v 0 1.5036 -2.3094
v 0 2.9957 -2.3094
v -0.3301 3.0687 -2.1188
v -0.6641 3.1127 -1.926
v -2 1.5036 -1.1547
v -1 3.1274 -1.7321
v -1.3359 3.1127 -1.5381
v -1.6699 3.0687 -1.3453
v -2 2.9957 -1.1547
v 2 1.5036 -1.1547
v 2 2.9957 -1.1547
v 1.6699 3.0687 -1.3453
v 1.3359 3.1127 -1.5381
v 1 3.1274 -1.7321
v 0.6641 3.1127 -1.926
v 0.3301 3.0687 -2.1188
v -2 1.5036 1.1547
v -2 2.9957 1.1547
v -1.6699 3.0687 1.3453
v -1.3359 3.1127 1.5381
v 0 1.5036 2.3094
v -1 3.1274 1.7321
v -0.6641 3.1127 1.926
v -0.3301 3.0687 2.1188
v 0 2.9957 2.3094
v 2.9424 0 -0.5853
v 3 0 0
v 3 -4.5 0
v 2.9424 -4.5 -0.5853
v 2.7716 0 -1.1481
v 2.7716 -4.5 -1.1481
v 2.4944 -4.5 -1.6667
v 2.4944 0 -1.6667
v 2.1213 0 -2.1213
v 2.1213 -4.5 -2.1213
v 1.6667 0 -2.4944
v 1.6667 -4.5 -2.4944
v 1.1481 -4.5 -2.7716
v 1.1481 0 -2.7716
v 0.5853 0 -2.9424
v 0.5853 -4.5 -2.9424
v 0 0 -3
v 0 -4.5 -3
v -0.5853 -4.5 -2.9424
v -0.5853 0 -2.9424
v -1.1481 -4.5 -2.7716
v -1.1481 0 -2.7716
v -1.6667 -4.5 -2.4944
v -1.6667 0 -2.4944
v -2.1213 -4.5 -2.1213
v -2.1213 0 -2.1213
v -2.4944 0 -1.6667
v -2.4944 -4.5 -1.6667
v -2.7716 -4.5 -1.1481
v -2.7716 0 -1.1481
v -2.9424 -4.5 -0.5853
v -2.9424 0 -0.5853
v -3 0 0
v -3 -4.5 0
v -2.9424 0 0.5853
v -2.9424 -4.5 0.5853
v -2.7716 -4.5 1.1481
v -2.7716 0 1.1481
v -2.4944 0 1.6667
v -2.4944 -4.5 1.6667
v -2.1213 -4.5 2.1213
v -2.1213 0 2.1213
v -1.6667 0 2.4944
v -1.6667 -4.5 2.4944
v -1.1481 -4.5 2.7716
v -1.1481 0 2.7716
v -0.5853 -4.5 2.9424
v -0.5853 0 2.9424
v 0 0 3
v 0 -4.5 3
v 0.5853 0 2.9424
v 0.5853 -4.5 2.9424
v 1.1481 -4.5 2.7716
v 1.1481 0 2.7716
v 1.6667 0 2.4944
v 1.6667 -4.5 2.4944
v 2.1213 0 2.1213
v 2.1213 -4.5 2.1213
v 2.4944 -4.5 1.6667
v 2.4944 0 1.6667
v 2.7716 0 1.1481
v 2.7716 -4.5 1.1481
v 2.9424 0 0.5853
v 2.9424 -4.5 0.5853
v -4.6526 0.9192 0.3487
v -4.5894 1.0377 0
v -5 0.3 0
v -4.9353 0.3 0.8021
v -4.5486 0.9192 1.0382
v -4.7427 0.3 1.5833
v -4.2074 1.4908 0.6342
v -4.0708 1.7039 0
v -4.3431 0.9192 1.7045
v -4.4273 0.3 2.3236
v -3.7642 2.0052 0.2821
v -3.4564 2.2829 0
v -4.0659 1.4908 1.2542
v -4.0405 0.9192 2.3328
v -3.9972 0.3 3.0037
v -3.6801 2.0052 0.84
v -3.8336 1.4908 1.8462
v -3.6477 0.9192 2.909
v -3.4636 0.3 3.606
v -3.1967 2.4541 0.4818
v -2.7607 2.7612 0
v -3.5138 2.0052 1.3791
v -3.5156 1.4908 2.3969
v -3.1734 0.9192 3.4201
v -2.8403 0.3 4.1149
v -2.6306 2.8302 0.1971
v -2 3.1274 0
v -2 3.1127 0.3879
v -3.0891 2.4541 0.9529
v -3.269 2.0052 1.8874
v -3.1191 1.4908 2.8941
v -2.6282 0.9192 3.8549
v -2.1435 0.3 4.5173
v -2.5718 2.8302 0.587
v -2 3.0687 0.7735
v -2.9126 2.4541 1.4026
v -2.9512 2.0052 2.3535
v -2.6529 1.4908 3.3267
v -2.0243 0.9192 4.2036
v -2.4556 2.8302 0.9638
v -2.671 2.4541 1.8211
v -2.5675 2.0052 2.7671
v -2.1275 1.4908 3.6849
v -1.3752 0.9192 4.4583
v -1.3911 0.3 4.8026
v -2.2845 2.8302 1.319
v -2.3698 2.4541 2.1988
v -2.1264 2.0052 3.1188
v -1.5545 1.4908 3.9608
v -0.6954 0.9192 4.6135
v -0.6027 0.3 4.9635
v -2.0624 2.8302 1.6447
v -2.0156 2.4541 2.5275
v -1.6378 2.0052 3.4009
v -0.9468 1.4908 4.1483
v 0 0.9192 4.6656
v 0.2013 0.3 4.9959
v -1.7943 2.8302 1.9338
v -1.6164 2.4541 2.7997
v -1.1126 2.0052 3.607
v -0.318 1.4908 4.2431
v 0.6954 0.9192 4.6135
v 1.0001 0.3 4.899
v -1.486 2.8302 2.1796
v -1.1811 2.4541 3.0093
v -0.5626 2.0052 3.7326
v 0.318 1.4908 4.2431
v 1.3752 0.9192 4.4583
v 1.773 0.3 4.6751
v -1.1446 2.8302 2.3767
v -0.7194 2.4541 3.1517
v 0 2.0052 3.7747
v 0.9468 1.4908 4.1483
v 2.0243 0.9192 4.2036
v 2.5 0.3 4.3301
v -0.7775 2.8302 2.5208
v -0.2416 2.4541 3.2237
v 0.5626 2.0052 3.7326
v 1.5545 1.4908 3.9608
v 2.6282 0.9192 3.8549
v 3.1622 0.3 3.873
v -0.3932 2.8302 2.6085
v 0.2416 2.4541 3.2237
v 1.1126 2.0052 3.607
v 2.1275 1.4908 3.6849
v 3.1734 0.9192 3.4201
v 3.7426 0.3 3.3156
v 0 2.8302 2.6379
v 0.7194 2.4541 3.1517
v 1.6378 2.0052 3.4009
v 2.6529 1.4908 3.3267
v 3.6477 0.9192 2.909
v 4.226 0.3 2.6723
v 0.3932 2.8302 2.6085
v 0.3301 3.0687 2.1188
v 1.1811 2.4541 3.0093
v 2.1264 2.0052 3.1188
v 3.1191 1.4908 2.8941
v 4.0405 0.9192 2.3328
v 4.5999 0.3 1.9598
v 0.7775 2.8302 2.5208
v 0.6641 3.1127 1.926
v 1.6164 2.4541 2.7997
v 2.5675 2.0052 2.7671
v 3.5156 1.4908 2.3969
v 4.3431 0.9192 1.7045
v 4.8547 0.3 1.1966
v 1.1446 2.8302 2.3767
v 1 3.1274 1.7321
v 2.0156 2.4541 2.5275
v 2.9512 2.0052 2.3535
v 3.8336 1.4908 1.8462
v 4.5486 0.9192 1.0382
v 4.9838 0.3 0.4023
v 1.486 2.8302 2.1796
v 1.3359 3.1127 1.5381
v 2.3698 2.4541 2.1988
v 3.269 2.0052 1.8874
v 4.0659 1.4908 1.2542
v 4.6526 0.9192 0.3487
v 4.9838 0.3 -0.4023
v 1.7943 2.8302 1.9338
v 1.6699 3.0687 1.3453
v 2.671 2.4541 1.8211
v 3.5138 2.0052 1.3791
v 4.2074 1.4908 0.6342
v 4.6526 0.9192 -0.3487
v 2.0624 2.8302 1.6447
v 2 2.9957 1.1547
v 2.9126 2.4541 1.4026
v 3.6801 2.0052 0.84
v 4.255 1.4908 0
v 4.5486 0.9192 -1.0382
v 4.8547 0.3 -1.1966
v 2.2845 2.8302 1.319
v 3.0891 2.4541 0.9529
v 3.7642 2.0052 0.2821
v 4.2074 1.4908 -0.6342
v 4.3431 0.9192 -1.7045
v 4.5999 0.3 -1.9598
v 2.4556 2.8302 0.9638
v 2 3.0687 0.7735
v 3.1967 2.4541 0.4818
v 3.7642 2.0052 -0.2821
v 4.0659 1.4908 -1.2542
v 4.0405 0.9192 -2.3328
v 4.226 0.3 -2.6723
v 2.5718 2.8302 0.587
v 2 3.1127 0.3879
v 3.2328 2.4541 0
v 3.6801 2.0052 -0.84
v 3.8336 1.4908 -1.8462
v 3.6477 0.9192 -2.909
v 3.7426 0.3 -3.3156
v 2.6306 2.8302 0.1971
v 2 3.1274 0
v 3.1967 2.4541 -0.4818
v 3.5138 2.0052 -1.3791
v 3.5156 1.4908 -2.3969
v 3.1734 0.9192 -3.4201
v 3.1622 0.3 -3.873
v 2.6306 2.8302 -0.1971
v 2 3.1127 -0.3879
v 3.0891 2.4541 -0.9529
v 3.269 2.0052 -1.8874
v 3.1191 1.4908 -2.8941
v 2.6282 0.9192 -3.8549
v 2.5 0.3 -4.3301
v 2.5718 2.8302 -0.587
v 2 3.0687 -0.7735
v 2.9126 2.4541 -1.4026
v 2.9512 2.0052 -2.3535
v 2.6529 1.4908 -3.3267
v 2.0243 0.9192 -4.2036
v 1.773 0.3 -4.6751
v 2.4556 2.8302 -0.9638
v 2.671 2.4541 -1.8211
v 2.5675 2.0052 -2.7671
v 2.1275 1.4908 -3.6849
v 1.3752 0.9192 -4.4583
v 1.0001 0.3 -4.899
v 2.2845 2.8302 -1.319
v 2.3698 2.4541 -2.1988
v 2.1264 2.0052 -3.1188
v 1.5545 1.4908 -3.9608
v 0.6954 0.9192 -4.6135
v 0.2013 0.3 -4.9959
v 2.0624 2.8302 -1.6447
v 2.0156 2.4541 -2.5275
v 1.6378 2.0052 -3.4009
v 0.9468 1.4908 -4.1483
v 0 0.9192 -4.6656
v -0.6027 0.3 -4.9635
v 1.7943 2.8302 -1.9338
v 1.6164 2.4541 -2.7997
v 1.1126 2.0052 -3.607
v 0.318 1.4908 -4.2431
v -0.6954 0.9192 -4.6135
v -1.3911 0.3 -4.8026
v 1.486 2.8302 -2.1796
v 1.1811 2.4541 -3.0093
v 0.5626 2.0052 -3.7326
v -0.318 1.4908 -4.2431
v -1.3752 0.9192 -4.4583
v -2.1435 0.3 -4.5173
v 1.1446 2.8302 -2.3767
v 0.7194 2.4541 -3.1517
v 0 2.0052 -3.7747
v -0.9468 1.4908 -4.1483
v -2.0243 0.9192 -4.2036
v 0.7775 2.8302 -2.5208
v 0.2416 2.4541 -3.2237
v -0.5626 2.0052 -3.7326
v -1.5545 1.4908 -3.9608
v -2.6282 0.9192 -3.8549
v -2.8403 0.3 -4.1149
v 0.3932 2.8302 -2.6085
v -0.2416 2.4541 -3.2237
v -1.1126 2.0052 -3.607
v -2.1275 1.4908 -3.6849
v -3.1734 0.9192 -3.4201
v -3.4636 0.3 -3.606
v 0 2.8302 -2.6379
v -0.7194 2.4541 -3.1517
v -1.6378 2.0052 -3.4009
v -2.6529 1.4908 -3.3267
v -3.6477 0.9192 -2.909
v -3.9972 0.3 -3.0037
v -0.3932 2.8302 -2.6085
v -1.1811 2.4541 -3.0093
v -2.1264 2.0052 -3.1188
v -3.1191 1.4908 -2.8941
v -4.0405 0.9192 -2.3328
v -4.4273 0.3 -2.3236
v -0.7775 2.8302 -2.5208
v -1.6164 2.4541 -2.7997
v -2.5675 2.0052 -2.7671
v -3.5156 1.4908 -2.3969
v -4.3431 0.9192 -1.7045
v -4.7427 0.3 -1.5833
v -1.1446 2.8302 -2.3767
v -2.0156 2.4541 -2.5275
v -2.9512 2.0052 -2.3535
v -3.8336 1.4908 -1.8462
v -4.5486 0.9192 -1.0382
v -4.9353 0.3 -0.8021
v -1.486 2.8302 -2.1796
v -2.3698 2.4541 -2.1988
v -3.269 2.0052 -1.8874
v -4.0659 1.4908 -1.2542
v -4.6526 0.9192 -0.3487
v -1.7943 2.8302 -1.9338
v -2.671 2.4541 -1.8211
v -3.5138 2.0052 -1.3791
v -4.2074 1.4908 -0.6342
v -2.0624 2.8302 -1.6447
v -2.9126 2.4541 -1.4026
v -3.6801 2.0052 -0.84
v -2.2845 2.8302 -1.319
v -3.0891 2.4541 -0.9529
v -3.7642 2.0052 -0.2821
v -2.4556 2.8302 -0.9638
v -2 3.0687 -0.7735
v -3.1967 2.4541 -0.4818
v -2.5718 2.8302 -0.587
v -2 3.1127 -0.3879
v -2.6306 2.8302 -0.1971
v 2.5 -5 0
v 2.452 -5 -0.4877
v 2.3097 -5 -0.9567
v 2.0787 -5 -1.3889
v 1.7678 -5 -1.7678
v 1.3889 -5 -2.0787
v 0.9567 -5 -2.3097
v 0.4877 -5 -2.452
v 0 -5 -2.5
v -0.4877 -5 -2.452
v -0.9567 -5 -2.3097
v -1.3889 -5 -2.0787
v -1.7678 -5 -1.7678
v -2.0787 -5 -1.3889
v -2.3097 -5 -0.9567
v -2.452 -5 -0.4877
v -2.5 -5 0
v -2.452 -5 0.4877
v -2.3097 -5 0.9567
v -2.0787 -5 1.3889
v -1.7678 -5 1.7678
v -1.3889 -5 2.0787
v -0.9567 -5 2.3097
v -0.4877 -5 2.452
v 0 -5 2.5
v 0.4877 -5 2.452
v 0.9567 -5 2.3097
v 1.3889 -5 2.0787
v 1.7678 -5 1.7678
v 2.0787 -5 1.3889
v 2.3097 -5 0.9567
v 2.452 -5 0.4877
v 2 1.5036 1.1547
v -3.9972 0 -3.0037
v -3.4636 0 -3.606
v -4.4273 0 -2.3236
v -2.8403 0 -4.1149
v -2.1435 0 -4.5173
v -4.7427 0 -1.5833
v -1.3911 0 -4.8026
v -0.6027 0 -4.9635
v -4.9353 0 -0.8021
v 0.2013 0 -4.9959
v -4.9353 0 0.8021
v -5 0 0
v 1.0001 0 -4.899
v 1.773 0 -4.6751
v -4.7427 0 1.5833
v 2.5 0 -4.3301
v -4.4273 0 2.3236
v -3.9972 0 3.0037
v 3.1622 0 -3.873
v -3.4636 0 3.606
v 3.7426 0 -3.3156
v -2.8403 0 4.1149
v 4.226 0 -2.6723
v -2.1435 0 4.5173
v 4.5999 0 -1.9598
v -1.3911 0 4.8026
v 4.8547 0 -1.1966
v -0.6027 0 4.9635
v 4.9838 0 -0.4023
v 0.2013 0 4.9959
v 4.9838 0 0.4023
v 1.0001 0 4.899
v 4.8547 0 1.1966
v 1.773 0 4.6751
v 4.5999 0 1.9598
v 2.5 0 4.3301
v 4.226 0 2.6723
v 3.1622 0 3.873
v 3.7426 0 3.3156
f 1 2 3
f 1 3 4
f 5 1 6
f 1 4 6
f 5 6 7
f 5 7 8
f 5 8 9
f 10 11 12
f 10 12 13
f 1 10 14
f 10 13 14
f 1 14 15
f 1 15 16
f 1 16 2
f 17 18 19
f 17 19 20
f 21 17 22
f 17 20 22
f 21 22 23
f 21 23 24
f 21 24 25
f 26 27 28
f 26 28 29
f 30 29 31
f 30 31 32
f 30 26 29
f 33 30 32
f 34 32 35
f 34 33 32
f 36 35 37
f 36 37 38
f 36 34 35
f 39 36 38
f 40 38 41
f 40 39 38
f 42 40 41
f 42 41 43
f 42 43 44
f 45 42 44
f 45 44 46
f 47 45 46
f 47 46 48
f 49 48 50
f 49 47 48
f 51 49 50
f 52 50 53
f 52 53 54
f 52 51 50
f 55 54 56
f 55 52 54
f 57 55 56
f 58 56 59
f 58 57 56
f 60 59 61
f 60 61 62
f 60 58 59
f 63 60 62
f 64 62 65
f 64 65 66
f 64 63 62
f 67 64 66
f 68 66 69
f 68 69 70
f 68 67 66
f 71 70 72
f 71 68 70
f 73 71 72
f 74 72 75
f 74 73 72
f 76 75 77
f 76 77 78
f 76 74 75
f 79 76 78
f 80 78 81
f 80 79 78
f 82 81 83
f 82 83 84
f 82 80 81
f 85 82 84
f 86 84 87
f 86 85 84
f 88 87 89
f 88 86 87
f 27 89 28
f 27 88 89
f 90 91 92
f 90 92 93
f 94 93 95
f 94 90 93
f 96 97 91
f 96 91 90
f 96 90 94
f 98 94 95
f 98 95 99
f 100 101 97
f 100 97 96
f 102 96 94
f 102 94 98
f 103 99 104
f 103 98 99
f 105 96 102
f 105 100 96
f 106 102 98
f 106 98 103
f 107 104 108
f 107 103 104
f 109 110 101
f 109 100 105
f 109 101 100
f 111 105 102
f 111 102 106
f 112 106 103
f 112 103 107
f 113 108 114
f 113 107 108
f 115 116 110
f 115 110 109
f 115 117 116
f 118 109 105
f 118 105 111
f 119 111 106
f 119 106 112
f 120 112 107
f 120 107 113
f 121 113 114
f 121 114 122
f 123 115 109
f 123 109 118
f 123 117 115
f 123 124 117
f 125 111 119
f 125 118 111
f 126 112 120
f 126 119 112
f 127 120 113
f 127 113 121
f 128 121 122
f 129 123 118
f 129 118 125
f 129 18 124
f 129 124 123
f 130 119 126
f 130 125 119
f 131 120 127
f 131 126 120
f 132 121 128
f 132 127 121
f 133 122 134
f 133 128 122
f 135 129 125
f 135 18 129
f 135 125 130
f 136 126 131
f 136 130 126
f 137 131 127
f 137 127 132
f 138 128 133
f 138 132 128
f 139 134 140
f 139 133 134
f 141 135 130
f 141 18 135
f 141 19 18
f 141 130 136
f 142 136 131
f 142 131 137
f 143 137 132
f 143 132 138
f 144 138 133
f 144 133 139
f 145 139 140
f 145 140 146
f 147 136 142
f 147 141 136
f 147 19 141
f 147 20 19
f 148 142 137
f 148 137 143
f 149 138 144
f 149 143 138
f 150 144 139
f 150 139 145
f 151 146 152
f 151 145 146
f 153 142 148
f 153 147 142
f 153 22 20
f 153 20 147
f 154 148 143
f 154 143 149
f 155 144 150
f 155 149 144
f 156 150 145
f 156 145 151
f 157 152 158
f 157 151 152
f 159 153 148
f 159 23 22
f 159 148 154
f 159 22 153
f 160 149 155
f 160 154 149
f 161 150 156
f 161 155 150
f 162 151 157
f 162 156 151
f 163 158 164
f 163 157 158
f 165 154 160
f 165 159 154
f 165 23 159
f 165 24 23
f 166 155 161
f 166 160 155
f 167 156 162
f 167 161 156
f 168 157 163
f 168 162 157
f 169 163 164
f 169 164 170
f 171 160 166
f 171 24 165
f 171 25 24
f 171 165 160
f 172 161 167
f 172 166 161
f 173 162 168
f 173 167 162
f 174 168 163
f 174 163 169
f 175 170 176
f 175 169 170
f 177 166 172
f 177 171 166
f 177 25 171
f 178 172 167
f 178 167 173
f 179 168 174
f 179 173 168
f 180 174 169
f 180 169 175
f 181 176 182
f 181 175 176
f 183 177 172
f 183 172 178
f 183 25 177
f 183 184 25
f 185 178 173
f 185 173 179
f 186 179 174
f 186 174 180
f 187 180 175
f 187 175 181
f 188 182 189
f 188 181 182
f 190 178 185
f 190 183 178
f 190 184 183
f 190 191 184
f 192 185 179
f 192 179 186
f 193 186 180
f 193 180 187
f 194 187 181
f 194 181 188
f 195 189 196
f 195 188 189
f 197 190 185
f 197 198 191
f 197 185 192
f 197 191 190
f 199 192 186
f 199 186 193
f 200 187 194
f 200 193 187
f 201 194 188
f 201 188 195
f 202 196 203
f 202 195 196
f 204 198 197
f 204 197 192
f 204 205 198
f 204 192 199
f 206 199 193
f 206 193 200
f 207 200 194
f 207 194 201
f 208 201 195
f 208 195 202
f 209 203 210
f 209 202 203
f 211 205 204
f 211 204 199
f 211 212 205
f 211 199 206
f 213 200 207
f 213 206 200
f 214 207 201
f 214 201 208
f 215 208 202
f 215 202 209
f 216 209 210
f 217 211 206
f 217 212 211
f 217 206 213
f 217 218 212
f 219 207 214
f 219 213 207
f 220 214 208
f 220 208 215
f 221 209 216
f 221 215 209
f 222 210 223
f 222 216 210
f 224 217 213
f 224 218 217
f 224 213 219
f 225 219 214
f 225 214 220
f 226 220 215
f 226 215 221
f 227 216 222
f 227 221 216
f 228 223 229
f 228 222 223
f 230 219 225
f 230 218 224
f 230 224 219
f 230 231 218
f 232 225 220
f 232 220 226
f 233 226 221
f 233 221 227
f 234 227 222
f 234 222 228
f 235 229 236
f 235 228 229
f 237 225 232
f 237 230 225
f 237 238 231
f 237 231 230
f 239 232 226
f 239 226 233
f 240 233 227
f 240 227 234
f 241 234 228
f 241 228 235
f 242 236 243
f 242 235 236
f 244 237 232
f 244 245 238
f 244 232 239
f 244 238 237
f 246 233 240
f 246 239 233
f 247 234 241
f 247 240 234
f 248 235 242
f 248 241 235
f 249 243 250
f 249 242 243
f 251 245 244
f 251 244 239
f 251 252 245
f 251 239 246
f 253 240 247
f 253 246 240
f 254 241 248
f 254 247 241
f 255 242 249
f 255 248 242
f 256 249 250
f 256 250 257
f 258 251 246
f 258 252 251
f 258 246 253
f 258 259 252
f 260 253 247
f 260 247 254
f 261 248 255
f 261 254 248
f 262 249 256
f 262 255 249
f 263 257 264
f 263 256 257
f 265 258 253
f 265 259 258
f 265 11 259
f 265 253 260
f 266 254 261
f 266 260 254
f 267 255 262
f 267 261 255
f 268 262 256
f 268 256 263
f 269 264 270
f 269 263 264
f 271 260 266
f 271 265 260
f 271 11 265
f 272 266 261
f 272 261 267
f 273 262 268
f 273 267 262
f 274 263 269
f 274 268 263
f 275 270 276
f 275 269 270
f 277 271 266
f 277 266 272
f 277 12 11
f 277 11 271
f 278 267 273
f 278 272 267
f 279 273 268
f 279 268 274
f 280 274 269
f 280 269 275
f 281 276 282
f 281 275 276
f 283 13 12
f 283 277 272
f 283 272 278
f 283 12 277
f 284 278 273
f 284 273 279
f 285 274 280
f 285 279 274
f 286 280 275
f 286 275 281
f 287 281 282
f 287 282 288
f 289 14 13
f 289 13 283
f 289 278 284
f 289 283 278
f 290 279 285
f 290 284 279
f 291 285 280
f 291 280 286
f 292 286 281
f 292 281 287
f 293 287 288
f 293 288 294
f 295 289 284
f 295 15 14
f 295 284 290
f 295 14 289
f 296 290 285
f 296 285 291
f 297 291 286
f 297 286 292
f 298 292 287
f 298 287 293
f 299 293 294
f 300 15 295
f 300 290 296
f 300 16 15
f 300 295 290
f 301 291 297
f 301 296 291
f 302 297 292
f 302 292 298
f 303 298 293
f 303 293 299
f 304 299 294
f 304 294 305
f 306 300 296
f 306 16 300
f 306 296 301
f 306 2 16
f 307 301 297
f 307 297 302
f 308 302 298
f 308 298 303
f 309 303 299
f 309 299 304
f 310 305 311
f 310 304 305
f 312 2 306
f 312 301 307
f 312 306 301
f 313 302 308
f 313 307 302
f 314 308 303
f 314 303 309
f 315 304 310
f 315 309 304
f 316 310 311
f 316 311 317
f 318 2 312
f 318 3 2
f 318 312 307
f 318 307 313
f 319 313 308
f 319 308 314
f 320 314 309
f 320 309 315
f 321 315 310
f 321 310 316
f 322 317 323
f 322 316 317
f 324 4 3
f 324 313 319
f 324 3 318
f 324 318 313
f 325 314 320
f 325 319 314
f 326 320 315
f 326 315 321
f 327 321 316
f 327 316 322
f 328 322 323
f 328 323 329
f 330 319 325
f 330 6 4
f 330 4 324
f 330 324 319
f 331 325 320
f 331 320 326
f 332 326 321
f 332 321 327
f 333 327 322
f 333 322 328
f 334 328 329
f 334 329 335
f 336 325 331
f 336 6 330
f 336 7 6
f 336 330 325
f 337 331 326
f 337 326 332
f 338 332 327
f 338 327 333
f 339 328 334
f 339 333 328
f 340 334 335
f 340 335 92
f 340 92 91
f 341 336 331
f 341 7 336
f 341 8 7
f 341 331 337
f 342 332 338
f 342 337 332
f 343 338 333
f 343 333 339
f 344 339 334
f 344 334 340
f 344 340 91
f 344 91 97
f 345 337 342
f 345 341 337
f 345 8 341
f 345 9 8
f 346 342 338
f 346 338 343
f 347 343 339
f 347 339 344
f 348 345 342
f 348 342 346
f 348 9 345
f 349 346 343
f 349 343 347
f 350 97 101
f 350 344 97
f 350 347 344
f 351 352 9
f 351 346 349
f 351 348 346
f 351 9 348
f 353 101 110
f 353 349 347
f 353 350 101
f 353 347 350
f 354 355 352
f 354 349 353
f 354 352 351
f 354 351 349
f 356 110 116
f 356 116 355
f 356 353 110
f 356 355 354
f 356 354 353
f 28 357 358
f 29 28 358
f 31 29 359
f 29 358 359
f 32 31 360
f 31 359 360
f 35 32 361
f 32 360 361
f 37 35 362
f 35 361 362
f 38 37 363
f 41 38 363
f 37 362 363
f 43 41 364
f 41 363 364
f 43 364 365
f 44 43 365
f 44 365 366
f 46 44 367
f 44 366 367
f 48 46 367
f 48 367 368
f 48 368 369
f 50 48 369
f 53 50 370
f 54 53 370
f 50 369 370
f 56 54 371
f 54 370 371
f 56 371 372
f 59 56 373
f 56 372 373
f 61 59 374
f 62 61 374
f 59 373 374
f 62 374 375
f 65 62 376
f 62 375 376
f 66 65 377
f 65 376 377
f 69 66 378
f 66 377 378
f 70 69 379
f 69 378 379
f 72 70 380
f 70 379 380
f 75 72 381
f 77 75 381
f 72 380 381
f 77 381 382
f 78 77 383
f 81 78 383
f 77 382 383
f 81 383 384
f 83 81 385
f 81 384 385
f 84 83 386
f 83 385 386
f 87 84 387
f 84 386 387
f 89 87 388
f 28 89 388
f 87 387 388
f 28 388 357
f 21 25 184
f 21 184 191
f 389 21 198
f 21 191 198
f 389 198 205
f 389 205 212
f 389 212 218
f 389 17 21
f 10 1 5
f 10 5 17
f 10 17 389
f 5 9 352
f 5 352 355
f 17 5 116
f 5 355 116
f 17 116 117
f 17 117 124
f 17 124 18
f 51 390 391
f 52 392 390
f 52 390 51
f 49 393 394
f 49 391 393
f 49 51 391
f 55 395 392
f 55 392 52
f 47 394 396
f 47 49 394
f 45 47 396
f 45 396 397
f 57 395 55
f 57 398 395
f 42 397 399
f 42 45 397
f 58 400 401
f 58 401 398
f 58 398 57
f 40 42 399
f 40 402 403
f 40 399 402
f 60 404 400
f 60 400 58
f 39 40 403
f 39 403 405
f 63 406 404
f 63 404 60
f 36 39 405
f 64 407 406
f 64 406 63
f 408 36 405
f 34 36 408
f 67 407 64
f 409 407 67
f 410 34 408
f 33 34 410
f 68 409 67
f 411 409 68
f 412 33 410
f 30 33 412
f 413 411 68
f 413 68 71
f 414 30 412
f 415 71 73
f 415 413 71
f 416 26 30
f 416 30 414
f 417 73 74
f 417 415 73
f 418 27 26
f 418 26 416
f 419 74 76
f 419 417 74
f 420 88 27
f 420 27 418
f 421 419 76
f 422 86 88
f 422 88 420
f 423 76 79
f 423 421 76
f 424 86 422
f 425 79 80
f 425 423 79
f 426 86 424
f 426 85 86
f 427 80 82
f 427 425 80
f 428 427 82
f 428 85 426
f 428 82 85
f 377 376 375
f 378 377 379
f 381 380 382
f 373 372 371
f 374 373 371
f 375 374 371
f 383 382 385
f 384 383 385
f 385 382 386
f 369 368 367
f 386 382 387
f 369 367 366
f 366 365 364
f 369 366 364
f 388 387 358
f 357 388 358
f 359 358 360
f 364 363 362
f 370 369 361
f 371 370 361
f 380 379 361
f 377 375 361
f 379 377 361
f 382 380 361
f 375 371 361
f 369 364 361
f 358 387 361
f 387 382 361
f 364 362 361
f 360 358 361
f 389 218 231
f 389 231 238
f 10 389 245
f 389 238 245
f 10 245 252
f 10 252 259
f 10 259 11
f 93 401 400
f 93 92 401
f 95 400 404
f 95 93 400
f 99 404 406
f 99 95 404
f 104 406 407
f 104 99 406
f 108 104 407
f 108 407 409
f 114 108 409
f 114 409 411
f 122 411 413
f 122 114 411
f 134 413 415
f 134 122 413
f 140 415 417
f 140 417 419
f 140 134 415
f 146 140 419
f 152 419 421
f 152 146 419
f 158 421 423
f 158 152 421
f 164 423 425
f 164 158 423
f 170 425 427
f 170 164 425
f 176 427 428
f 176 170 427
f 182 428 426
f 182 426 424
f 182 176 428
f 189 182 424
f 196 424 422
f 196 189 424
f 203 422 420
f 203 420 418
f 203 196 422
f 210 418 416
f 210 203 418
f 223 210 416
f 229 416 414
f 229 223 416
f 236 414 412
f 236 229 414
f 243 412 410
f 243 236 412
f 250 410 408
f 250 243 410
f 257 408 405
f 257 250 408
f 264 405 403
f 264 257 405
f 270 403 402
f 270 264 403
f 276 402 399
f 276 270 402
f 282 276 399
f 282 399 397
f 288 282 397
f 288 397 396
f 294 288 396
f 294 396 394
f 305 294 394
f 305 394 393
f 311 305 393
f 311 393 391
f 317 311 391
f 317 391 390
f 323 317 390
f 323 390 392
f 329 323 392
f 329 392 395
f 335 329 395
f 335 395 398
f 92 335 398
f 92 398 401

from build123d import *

# Parameters (mm, degrees)
SKETCH1_R           = 3
BOSS_EXTRUDE3_DEPTH = 5
CHAMFER2_SIZE       = 0.5
CUT_EXTRUDE2_DEPTH  = 2


with BuildPart() as part:
    # Sketch1 → Boss-Extrude3 (new body)
    with BuildSketch(Plane(origin=(0, 0, 0), x_dir=(1, 0, 0), z_dir=(0, 1, 0))):
        Circle(SKETCH1_R)
    extrude(amount=-BOSS_EXTRUDE3_DEPTH)

    # Sketch3 → Revolve2 (revolve)
    with BuildSketch(Plane.XY):
        with BuildLine():
            Line((-5, 0), (-5, 0.3))
            ThreePointArc((-5, 0.3), (-2.969144584, 2.634024216), (0, 3.503635162))
            Line((0, 3.503635162), (0, 0))
            Line((0, 0), (-5, 0))
        make_face()
    revolve(axis=Axis((0, -2, 0), (0, 1, 0)))

    # Chamfer2
    chamfer2_edges = [part.edges().sort_by_distance(p)[0] for p in [
        (-3, -5, 0),
    ]]
    chamfer(chamfer2_edges, length=CHAMFER2_SIZE)

    # Sketch4 → Cut-Extrude2 (cut)
    with BuildSketch(Plane(origin=(0, 3.503635162, 0), x_dir=(1, 0, 0), z_dir=(0, 1, 0))):
        Polygon((0, 2.309401077), (-2, 1.154700538), (-2, -1.154700538), (0, -2.309401077), (2, -1.154700538), (2, 1.154700538), align=None)
    extrude(amount=-CUT_EXTRUDE2_DEPTH, mode=Mode.SUBTRACT)


solid = part.part
